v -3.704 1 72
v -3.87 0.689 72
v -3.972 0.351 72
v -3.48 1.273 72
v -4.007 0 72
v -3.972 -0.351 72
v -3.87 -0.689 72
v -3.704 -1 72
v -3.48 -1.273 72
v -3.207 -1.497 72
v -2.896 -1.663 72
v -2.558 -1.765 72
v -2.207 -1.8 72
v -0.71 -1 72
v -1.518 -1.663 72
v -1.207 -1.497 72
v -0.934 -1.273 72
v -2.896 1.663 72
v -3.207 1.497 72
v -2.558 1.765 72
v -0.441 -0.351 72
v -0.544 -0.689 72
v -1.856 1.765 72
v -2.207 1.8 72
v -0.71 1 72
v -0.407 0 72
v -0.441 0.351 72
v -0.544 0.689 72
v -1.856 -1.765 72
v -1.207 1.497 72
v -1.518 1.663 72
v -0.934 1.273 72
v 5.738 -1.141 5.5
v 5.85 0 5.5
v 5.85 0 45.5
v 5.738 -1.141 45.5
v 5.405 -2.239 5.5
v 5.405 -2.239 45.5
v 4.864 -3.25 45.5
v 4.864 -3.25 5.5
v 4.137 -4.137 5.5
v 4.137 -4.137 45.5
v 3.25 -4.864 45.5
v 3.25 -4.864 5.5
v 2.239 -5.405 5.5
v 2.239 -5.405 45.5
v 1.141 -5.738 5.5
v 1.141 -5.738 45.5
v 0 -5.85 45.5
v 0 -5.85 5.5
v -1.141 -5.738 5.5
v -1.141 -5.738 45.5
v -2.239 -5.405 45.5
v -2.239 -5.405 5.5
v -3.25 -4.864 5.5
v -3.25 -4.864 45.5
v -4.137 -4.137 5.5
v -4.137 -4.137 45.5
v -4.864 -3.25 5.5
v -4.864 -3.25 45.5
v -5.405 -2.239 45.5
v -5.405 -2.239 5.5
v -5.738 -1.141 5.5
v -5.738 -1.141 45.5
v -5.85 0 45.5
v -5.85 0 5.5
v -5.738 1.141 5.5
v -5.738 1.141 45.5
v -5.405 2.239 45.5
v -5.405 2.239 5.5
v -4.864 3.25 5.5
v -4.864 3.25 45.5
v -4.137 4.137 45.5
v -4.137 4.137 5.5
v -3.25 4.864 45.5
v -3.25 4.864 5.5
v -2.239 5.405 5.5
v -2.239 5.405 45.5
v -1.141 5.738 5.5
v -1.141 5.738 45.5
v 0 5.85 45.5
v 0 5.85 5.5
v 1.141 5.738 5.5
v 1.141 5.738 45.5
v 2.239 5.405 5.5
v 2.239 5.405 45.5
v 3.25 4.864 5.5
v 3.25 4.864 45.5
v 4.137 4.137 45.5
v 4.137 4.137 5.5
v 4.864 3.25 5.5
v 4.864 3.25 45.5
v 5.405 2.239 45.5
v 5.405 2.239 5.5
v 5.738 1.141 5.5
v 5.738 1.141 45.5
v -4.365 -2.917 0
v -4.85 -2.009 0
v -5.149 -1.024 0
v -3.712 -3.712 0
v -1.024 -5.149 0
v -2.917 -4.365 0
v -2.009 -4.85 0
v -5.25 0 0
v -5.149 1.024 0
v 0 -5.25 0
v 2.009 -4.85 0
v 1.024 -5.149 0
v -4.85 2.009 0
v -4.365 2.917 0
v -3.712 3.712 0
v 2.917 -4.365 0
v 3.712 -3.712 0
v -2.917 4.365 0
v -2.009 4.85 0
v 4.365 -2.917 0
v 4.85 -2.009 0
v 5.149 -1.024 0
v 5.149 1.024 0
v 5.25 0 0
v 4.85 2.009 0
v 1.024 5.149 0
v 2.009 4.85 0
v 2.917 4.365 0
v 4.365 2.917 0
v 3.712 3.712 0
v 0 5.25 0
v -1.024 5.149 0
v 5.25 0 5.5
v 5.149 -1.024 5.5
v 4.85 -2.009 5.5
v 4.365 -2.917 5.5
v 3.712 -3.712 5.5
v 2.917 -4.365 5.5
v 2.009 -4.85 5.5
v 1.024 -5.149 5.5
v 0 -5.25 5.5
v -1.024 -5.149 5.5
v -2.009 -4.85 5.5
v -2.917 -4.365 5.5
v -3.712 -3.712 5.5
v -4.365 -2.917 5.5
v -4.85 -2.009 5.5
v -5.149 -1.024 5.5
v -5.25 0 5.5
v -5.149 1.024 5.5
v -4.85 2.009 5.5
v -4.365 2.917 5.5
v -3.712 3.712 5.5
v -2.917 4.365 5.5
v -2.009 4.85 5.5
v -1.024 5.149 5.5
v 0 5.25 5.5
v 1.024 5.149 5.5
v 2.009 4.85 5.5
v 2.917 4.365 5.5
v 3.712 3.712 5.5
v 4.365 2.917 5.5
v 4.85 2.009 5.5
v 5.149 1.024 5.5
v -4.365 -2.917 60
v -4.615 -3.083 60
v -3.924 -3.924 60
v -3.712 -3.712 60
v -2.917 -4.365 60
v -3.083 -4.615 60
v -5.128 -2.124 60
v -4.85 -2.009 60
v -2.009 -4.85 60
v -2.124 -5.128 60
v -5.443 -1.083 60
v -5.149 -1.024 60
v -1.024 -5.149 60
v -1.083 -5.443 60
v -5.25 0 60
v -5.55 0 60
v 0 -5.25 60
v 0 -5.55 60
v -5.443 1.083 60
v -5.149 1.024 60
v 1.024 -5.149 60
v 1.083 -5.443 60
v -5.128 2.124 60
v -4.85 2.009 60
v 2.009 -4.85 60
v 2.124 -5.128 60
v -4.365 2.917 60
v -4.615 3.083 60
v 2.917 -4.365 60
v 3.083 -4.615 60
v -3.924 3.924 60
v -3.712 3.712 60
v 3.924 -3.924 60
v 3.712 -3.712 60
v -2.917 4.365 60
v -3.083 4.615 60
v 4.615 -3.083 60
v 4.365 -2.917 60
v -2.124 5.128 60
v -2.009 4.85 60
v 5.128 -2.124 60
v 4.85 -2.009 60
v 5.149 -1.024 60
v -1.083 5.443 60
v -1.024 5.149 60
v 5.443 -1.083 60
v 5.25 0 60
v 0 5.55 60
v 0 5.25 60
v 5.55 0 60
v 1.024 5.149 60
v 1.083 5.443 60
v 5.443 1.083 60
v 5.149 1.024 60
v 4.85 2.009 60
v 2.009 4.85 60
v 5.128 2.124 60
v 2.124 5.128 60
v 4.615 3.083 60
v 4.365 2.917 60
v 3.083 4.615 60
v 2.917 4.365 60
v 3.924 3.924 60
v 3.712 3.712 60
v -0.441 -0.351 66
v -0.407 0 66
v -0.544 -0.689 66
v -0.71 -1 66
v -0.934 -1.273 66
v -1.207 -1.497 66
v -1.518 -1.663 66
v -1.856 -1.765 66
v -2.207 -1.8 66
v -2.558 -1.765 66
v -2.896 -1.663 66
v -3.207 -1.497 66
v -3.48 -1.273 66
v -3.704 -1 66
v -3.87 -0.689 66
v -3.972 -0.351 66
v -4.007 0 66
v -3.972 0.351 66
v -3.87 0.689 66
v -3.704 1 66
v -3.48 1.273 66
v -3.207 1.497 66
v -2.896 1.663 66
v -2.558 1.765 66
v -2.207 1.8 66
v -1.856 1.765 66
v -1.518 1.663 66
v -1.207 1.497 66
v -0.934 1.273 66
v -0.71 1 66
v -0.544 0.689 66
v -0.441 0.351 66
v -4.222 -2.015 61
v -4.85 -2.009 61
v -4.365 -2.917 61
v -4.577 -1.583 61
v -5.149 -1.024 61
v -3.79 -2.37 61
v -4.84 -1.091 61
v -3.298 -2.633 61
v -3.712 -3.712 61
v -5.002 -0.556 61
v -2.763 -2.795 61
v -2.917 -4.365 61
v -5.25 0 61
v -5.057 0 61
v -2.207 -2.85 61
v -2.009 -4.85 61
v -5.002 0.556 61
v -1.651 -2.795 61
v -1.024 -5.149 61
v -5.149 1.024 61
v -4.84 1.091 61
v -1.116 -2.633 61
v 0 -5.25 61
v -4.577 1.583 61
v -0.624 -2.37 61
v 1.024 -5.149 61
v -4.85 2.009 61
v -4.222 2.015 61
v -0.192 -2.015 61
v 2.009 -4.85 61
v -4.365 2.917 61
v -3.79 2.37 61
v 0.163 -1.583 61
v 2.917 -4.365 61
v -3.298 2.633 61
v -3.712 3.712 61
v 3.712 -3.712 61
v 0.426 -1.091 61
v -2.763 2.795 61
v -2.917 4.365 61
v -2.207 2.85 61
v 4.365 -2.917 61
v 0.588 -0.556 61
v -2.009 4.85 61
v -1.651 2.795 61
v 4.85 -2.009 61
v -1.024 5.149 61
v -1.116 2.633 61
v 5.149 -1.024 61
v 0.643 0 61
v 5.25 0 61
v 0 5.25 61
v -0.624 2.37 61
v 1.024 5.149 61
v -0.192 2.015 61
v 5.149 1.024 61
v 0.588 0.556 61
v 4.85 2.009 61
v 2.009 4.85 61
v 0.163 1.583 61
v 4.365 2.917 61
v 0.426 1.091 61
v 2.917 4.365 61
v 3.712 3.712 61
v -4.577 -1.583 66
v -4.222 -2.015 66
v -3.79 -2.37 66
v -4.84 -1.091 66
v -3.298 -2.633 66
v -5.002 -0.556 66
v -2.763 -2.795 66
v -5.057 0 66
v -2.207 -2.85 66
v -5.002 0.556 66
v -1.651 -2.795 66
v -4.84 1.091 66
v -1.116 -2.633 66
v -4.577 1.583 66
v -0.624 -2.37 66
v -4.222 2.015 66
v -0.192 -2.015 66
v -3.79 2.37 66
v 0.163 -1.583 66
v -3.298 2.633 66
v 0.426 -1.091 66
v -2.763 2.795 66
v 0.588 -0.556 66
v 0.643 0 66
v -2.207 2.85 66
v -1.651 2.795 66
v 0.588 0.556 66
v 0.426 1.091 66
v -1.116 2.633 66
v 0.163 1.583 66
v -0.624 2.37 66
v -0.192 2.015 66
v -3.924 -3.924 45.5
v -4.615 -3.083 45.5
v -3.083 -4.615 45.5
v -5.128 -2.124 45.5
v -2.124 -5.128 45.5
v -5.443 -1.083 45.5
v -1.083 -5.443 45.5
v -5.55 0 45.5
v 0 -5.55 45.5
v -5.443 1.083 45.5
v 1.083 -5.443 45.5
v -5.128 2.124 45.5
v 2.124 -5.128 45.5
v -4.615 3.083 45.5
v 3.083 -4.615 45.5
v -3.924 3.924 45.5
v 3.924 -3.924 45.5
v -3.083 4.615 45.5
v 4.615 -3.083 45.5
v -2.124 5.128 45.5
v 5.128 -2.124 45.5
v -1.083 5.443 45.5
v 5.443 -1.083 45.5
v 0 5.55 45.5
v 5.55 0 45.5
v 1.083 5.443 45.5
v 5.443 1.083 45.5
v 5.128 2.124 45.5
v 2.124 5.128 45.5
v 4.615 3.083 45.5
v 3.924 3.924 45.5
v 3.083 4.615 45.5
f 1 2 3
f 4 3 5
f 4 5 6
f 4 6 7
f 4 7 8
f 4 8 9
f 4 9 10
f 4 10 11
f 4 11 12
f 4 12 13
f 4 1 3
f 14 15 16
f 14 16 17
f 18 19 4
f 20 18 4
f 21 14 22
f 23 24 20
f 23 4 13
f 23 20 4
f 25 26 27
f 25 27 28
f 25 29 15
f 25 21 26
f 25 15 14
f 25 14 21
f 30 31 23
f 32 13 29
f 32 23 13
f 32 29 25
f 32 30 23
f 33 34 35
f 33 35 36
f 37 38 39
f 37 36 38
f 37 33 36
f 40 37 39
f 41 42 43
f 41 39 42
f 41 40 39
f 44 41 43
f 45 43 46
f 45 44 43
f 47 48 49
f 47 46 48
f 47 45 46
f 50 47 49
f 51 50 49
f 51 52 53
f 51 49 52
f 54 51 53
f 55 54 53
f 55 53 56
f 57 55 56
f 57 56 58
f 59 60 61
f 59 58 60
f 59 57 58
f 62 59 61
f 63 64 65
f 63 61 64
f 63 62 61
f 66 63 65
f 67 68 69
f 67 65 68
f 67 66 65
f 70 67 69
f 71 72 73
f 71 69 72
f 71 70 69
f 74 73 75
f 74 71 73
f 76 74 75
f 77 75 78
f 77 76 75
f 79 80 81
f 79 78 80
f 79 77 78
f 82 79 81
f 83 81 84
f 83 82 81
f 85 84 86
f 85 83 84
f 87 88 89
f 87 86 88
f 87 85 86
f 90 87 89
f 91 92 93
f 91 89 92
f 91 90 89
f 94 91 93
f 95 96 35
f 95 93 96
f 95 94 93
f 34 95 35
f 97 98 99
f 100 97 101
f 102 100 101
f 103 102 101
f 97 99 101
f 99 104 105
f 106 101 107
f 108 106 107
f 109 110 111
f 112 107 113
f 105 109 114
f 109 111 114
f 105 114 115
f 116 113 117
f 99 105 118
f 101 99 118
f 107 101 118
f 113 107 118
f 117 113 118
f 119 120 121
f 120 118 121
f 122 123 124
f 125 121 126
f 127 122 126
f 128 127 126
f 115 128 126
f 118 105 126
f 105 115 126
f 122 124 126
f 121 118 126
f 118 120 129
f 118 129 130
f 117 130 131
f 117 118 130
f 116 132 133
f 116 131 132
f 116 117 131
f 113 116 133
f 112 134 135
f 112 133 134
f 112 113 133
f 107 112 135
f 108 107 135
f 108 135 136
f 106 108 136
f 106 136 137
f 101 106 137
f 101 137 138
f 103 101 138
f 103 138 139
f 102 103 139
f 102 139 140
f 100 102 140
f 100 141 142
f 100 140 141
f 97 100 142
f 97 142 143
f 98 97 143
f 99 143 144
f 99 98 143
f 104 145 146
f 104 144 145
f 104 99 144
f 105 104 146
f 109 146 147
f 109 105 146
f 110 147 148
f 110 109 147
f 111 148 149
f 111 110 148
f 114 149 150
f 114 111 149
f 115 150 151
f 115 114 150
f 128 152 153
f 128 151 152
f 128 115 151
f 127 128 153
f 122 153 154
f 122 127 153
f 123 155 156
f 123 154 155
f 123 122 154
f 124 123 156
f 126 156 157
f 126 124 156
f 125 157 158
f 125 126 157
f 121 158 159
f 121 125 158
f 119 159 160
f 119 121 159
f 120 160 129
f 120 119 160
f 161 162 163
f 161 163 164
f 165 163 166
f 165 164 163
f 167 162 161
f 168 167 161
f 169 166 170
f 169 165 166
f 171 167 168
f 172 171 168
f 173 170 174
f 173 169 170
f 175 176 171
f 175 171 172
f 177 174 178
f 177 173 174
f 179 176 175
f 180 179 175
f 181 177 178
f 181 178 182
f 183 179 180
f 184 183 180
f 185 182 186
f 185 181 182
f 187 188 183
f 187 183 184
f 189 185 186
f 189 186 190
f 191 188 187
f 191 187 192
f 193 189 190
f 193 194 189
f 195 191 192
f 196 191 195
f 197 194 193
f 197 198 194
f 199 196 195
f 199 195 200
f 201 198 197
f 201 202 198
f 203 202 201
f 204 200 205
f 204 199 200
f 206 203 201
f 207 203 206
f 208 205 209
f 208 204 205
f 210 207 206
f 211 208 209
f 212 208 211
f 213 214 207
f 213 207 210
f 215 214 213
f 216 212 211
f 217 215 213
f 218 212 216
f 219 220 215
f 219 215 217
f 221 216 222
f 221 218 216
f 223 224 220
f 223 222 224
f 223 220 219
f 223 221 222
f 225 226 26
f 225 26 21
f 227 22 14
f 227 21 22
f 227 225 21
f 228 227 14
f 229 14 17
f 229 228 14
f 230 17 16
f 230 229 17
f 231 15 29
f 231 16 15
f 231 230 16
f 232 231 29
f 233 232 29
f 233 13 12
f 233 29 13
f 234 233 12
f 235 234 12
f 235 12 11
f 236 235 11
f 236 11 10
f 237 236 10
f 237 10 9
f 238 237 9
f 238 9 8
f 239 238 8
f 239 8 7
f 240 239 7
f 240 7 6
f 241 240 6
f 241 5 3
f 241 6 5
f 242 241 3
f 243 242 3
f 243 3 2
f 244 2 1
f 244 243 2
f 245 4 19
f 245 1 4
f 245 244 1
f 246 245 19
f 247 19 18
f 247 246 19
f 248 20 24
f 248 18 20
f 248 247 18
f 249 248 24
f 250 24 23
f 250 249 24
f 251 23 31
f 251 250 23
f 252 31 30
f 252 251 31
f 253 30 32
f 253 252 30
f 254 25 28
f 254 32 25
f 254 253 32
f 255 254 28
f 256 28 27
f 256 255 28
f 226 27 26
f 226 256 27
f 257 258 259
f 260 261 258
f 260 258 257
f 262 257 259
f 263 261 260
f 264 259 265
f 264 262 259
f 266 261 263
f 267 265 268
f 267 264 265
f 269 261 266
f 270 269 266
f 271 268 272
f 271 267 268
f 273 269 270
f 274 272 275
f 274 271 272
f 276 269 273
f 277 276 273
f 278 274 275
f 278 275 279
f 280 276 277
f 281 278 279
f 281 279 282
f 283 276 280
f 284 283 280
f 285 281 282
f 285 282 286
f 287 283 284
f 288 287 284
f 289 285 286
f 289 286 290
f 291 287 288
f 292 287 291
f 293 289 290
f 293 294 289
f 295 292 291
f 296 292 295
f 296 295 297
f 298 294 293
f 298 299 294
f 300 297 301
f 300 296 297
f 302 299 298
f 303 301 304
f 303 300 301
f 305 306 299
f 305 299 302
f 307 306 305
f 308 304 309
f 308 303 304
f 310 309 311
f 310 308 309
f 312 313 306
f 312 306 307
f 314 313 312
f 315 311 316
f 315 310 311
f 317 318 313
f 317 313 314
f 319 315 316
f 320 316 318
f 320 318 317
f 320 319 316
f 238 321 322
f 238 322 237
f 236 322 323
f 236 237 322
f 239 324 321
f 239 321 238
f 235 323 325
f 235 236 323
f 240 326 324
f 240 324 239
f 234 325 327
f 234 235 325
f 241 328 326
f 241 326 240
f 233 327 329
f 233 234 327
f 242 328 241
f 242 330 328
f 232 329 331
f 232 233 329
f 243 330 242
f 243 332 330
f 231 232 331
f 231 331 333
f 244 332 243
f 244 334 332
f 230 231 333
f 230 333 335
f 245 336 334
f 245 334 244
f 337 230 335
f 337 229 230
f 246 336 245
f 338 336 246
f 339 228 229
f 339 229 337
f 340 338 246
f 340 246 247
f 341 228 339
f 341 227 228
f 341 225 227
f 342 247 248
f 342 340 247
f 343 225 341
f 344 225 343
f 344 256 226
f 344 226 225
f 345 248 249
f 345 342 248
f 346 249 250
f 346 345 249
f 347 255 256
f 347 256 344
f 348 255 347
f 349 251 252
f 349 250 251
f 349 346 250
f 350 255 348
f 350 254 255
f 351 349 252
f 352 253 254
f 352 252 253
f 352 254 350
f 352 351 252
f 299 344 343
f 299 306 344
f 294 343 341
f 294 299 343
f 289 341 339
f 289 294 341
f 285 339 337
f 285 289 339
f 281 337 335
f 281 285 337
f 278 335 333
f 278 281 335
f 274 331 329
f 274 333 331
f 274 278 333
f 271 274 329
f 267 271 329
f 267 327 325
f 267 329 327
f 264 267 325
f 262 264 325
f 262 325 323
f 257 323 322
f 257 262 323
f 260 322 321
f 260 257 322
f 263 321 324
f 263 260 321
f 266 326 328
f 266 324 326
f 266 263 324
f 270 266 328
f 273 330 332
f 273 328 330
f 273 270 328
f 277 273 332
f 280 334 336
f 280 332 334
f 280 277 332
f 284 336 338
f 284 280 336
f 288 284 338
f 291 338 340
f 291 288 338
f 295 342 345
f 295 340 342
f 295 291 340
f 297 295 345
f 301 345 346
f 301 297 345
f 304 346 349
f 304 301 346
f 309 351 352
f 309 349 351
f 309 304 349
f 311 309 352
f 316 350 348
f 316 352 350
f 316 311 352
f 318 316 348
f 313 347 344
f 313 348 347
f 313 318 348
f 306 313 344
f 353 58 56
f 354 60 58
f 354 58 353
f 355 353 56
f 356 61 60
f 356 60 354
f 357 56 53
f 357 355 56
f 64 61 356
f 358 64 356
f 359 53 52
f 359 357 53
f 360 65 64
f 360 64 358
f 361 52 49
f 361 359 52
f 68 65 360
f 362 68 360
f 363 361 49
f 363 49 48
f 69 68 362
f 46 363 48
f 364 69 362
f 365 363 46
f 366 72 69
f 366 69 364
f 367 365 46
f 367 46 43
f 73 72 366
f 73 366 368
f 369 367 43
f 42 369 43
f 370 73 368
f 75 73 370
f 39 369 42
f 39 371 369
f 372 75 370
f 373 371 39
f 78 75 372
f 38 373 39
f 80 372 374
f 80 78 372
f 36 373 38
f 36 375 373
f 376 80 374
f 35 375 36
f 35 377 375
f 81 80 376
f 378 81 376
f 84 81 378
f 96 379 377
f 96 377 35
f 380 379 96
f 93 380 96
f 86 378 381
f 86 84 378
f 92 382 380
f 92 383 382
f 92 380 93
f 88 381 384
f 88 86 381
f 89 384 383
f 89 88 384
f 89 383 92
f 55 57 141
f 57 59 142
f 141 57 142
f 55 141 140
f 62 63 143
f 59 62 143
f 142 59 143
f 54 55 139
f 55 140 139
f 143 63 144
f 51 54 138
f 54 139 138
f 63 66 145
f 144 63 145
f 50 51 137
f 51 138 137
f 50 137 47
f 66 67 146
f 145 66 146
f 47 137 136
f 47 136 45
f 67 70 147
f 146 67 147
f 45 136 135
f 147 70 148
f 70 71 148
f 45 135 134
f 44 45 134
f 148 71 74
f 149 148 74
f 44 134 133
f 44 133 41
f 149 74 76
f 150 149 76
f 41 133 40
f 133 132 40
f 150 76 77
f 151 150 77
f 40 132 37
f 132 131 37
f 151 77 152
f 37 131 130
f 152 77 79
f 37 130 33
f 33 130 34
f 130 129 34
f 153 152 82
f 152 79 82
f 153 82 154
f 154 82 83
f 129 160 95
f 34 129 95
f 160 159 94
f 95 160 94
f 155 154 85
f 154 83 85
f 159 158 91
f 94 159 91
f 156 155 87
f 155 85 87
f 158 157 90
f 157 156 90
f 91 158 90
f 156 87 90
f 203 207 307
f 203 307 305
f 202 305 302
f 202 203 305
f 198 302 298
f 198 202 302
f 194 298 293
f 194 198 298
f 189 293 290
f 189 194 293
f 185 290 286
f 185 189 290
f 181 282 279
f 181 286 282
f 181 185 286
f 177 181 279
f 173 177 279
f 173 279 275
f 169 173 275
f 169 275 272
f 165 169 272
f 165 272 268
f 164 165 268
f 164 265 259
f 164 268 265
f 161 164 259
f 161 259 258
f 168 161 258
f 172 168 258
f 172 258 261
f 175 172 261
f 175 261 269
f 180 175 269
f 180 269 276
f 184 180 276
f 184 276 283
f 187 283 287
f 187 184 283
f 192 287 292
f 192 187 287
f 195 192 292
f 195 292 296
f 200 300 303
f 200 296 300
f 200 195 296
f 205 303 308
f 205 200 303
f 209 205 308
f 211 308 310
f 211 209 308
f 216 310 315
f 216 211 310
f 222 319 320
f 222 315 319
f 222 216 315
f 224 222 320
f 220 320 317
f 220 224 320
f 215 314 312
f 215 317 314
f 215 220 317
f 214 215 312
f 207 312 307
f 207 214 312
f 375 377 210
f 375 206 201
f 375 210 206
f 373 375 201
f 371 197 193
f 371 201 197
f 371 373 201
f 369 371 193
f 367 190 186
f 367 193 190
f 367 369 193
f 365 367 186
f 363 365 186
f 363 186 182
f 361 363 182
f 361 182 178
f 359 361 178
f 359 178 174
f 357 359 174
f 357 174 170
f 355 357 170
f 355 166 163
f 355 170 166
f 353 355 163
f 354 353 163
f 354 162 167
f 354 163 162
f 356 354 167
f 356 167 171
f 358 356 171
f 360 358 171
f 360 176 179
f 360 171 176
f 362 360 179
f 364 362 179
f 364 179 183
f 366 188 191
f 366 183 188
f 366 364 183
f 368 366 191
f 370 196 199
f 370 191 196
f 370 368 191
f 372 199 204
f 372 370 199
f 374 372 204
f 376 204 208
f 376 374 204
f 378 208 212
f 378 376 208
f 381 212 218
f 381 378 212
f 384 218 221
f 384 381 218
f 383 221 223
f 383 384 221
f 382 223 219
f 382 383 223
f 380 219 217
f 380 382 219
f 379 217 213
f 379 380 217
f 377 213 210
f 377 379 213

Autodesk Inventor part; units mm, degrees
ref_plane "YZ Plane" through (0, 0, 0) normal (1, 0, 0) x (0, 1, 0)
ref_plane "XZ Plane" through (0, 0, 0) normal (0, 1, 0) x (-1, 0, 0)
ref_plane "XY Plane" through (0, 0, 0) normal (0, 0, 1) x (1, 0, 0)
sketch "Szkic1" plane through (0, 0, 0) normal (0, 0, 1) x (1, 0, 0)
  circle A0 centre (0, 0) radius 5.25
  dimension "d0" = 10.5
extrude "Wyciągnięcie proste1" add sketch "Szkic1" along normal blind 5.5
sketch "Szkic2" plane through (0, 0, 5.5) normal (0, 0, 1) x (1, 0, 0)
  circle A0 centre (0, 0) radius 5.25 projected
  circle A1 centre (0, 0) radius 5.85
  dimension "d3" = 11.7
extrude "Wyciągnięcie proste2" add sketch "Szkic2" along normal blind 40 contours A0 | A1
sketch "Szkic3" plane through (0, 0, 45.5) normal (0, 0, 1) x (1, 0, 0)
  circle A0 centre (0, 0) radius 5.85 projected
  circle A1 centre (0, 0) radius 5.55
  dimension "d6" = 11.1
extrude "Wyciągnięcie proste3" add sketch "Szkic3" along normal blind 14.5 contours A1
thread "Gwint1" size "M12x1.75" class "6g" standard "ANSI Metric M Profile" full length
sketch "Szkic4" plane through (0, 0, 60) normal (0, 0, 1) x (1, 0, 0)
  circle A0 centre (0, 0) radius 5.25
  dimension "d11" = 10.5
extrude "Wyciągnięcie proste4" add sketch "Szkic4" along normal blind 1
sketch "Szkic5" plane through (0, 0, 61) normal (0, 0, 1) x (1, 0, 0)
  circle A0 centre (0, 0) radius 5.25 projected
  circle A1 centre (-2.2069, 0) radius 2.85
  dimension "d14" = 5.7
extrude "Wyciągnięcie proste5" add sketch "Szkic5" along normal blind 5 contours A1
sketch "Szkic6" plane through (-2.2069, 0, 66) normal (0, 0, 1) x (1, 0, 0)
  circle A0 centre (0, 0) radius 2.85 projected
  circle A1 centre (0, 0) radius 1.8
  point P0 (2.2069, 0)
  dimension "d17" = 3.6
extrude "Wyciągnięcie proste6" add sketch "Szkic6" along normal blind 6 contours A1
properties part number "COTS_GENERIC_Induction_Distance_Sensor"
